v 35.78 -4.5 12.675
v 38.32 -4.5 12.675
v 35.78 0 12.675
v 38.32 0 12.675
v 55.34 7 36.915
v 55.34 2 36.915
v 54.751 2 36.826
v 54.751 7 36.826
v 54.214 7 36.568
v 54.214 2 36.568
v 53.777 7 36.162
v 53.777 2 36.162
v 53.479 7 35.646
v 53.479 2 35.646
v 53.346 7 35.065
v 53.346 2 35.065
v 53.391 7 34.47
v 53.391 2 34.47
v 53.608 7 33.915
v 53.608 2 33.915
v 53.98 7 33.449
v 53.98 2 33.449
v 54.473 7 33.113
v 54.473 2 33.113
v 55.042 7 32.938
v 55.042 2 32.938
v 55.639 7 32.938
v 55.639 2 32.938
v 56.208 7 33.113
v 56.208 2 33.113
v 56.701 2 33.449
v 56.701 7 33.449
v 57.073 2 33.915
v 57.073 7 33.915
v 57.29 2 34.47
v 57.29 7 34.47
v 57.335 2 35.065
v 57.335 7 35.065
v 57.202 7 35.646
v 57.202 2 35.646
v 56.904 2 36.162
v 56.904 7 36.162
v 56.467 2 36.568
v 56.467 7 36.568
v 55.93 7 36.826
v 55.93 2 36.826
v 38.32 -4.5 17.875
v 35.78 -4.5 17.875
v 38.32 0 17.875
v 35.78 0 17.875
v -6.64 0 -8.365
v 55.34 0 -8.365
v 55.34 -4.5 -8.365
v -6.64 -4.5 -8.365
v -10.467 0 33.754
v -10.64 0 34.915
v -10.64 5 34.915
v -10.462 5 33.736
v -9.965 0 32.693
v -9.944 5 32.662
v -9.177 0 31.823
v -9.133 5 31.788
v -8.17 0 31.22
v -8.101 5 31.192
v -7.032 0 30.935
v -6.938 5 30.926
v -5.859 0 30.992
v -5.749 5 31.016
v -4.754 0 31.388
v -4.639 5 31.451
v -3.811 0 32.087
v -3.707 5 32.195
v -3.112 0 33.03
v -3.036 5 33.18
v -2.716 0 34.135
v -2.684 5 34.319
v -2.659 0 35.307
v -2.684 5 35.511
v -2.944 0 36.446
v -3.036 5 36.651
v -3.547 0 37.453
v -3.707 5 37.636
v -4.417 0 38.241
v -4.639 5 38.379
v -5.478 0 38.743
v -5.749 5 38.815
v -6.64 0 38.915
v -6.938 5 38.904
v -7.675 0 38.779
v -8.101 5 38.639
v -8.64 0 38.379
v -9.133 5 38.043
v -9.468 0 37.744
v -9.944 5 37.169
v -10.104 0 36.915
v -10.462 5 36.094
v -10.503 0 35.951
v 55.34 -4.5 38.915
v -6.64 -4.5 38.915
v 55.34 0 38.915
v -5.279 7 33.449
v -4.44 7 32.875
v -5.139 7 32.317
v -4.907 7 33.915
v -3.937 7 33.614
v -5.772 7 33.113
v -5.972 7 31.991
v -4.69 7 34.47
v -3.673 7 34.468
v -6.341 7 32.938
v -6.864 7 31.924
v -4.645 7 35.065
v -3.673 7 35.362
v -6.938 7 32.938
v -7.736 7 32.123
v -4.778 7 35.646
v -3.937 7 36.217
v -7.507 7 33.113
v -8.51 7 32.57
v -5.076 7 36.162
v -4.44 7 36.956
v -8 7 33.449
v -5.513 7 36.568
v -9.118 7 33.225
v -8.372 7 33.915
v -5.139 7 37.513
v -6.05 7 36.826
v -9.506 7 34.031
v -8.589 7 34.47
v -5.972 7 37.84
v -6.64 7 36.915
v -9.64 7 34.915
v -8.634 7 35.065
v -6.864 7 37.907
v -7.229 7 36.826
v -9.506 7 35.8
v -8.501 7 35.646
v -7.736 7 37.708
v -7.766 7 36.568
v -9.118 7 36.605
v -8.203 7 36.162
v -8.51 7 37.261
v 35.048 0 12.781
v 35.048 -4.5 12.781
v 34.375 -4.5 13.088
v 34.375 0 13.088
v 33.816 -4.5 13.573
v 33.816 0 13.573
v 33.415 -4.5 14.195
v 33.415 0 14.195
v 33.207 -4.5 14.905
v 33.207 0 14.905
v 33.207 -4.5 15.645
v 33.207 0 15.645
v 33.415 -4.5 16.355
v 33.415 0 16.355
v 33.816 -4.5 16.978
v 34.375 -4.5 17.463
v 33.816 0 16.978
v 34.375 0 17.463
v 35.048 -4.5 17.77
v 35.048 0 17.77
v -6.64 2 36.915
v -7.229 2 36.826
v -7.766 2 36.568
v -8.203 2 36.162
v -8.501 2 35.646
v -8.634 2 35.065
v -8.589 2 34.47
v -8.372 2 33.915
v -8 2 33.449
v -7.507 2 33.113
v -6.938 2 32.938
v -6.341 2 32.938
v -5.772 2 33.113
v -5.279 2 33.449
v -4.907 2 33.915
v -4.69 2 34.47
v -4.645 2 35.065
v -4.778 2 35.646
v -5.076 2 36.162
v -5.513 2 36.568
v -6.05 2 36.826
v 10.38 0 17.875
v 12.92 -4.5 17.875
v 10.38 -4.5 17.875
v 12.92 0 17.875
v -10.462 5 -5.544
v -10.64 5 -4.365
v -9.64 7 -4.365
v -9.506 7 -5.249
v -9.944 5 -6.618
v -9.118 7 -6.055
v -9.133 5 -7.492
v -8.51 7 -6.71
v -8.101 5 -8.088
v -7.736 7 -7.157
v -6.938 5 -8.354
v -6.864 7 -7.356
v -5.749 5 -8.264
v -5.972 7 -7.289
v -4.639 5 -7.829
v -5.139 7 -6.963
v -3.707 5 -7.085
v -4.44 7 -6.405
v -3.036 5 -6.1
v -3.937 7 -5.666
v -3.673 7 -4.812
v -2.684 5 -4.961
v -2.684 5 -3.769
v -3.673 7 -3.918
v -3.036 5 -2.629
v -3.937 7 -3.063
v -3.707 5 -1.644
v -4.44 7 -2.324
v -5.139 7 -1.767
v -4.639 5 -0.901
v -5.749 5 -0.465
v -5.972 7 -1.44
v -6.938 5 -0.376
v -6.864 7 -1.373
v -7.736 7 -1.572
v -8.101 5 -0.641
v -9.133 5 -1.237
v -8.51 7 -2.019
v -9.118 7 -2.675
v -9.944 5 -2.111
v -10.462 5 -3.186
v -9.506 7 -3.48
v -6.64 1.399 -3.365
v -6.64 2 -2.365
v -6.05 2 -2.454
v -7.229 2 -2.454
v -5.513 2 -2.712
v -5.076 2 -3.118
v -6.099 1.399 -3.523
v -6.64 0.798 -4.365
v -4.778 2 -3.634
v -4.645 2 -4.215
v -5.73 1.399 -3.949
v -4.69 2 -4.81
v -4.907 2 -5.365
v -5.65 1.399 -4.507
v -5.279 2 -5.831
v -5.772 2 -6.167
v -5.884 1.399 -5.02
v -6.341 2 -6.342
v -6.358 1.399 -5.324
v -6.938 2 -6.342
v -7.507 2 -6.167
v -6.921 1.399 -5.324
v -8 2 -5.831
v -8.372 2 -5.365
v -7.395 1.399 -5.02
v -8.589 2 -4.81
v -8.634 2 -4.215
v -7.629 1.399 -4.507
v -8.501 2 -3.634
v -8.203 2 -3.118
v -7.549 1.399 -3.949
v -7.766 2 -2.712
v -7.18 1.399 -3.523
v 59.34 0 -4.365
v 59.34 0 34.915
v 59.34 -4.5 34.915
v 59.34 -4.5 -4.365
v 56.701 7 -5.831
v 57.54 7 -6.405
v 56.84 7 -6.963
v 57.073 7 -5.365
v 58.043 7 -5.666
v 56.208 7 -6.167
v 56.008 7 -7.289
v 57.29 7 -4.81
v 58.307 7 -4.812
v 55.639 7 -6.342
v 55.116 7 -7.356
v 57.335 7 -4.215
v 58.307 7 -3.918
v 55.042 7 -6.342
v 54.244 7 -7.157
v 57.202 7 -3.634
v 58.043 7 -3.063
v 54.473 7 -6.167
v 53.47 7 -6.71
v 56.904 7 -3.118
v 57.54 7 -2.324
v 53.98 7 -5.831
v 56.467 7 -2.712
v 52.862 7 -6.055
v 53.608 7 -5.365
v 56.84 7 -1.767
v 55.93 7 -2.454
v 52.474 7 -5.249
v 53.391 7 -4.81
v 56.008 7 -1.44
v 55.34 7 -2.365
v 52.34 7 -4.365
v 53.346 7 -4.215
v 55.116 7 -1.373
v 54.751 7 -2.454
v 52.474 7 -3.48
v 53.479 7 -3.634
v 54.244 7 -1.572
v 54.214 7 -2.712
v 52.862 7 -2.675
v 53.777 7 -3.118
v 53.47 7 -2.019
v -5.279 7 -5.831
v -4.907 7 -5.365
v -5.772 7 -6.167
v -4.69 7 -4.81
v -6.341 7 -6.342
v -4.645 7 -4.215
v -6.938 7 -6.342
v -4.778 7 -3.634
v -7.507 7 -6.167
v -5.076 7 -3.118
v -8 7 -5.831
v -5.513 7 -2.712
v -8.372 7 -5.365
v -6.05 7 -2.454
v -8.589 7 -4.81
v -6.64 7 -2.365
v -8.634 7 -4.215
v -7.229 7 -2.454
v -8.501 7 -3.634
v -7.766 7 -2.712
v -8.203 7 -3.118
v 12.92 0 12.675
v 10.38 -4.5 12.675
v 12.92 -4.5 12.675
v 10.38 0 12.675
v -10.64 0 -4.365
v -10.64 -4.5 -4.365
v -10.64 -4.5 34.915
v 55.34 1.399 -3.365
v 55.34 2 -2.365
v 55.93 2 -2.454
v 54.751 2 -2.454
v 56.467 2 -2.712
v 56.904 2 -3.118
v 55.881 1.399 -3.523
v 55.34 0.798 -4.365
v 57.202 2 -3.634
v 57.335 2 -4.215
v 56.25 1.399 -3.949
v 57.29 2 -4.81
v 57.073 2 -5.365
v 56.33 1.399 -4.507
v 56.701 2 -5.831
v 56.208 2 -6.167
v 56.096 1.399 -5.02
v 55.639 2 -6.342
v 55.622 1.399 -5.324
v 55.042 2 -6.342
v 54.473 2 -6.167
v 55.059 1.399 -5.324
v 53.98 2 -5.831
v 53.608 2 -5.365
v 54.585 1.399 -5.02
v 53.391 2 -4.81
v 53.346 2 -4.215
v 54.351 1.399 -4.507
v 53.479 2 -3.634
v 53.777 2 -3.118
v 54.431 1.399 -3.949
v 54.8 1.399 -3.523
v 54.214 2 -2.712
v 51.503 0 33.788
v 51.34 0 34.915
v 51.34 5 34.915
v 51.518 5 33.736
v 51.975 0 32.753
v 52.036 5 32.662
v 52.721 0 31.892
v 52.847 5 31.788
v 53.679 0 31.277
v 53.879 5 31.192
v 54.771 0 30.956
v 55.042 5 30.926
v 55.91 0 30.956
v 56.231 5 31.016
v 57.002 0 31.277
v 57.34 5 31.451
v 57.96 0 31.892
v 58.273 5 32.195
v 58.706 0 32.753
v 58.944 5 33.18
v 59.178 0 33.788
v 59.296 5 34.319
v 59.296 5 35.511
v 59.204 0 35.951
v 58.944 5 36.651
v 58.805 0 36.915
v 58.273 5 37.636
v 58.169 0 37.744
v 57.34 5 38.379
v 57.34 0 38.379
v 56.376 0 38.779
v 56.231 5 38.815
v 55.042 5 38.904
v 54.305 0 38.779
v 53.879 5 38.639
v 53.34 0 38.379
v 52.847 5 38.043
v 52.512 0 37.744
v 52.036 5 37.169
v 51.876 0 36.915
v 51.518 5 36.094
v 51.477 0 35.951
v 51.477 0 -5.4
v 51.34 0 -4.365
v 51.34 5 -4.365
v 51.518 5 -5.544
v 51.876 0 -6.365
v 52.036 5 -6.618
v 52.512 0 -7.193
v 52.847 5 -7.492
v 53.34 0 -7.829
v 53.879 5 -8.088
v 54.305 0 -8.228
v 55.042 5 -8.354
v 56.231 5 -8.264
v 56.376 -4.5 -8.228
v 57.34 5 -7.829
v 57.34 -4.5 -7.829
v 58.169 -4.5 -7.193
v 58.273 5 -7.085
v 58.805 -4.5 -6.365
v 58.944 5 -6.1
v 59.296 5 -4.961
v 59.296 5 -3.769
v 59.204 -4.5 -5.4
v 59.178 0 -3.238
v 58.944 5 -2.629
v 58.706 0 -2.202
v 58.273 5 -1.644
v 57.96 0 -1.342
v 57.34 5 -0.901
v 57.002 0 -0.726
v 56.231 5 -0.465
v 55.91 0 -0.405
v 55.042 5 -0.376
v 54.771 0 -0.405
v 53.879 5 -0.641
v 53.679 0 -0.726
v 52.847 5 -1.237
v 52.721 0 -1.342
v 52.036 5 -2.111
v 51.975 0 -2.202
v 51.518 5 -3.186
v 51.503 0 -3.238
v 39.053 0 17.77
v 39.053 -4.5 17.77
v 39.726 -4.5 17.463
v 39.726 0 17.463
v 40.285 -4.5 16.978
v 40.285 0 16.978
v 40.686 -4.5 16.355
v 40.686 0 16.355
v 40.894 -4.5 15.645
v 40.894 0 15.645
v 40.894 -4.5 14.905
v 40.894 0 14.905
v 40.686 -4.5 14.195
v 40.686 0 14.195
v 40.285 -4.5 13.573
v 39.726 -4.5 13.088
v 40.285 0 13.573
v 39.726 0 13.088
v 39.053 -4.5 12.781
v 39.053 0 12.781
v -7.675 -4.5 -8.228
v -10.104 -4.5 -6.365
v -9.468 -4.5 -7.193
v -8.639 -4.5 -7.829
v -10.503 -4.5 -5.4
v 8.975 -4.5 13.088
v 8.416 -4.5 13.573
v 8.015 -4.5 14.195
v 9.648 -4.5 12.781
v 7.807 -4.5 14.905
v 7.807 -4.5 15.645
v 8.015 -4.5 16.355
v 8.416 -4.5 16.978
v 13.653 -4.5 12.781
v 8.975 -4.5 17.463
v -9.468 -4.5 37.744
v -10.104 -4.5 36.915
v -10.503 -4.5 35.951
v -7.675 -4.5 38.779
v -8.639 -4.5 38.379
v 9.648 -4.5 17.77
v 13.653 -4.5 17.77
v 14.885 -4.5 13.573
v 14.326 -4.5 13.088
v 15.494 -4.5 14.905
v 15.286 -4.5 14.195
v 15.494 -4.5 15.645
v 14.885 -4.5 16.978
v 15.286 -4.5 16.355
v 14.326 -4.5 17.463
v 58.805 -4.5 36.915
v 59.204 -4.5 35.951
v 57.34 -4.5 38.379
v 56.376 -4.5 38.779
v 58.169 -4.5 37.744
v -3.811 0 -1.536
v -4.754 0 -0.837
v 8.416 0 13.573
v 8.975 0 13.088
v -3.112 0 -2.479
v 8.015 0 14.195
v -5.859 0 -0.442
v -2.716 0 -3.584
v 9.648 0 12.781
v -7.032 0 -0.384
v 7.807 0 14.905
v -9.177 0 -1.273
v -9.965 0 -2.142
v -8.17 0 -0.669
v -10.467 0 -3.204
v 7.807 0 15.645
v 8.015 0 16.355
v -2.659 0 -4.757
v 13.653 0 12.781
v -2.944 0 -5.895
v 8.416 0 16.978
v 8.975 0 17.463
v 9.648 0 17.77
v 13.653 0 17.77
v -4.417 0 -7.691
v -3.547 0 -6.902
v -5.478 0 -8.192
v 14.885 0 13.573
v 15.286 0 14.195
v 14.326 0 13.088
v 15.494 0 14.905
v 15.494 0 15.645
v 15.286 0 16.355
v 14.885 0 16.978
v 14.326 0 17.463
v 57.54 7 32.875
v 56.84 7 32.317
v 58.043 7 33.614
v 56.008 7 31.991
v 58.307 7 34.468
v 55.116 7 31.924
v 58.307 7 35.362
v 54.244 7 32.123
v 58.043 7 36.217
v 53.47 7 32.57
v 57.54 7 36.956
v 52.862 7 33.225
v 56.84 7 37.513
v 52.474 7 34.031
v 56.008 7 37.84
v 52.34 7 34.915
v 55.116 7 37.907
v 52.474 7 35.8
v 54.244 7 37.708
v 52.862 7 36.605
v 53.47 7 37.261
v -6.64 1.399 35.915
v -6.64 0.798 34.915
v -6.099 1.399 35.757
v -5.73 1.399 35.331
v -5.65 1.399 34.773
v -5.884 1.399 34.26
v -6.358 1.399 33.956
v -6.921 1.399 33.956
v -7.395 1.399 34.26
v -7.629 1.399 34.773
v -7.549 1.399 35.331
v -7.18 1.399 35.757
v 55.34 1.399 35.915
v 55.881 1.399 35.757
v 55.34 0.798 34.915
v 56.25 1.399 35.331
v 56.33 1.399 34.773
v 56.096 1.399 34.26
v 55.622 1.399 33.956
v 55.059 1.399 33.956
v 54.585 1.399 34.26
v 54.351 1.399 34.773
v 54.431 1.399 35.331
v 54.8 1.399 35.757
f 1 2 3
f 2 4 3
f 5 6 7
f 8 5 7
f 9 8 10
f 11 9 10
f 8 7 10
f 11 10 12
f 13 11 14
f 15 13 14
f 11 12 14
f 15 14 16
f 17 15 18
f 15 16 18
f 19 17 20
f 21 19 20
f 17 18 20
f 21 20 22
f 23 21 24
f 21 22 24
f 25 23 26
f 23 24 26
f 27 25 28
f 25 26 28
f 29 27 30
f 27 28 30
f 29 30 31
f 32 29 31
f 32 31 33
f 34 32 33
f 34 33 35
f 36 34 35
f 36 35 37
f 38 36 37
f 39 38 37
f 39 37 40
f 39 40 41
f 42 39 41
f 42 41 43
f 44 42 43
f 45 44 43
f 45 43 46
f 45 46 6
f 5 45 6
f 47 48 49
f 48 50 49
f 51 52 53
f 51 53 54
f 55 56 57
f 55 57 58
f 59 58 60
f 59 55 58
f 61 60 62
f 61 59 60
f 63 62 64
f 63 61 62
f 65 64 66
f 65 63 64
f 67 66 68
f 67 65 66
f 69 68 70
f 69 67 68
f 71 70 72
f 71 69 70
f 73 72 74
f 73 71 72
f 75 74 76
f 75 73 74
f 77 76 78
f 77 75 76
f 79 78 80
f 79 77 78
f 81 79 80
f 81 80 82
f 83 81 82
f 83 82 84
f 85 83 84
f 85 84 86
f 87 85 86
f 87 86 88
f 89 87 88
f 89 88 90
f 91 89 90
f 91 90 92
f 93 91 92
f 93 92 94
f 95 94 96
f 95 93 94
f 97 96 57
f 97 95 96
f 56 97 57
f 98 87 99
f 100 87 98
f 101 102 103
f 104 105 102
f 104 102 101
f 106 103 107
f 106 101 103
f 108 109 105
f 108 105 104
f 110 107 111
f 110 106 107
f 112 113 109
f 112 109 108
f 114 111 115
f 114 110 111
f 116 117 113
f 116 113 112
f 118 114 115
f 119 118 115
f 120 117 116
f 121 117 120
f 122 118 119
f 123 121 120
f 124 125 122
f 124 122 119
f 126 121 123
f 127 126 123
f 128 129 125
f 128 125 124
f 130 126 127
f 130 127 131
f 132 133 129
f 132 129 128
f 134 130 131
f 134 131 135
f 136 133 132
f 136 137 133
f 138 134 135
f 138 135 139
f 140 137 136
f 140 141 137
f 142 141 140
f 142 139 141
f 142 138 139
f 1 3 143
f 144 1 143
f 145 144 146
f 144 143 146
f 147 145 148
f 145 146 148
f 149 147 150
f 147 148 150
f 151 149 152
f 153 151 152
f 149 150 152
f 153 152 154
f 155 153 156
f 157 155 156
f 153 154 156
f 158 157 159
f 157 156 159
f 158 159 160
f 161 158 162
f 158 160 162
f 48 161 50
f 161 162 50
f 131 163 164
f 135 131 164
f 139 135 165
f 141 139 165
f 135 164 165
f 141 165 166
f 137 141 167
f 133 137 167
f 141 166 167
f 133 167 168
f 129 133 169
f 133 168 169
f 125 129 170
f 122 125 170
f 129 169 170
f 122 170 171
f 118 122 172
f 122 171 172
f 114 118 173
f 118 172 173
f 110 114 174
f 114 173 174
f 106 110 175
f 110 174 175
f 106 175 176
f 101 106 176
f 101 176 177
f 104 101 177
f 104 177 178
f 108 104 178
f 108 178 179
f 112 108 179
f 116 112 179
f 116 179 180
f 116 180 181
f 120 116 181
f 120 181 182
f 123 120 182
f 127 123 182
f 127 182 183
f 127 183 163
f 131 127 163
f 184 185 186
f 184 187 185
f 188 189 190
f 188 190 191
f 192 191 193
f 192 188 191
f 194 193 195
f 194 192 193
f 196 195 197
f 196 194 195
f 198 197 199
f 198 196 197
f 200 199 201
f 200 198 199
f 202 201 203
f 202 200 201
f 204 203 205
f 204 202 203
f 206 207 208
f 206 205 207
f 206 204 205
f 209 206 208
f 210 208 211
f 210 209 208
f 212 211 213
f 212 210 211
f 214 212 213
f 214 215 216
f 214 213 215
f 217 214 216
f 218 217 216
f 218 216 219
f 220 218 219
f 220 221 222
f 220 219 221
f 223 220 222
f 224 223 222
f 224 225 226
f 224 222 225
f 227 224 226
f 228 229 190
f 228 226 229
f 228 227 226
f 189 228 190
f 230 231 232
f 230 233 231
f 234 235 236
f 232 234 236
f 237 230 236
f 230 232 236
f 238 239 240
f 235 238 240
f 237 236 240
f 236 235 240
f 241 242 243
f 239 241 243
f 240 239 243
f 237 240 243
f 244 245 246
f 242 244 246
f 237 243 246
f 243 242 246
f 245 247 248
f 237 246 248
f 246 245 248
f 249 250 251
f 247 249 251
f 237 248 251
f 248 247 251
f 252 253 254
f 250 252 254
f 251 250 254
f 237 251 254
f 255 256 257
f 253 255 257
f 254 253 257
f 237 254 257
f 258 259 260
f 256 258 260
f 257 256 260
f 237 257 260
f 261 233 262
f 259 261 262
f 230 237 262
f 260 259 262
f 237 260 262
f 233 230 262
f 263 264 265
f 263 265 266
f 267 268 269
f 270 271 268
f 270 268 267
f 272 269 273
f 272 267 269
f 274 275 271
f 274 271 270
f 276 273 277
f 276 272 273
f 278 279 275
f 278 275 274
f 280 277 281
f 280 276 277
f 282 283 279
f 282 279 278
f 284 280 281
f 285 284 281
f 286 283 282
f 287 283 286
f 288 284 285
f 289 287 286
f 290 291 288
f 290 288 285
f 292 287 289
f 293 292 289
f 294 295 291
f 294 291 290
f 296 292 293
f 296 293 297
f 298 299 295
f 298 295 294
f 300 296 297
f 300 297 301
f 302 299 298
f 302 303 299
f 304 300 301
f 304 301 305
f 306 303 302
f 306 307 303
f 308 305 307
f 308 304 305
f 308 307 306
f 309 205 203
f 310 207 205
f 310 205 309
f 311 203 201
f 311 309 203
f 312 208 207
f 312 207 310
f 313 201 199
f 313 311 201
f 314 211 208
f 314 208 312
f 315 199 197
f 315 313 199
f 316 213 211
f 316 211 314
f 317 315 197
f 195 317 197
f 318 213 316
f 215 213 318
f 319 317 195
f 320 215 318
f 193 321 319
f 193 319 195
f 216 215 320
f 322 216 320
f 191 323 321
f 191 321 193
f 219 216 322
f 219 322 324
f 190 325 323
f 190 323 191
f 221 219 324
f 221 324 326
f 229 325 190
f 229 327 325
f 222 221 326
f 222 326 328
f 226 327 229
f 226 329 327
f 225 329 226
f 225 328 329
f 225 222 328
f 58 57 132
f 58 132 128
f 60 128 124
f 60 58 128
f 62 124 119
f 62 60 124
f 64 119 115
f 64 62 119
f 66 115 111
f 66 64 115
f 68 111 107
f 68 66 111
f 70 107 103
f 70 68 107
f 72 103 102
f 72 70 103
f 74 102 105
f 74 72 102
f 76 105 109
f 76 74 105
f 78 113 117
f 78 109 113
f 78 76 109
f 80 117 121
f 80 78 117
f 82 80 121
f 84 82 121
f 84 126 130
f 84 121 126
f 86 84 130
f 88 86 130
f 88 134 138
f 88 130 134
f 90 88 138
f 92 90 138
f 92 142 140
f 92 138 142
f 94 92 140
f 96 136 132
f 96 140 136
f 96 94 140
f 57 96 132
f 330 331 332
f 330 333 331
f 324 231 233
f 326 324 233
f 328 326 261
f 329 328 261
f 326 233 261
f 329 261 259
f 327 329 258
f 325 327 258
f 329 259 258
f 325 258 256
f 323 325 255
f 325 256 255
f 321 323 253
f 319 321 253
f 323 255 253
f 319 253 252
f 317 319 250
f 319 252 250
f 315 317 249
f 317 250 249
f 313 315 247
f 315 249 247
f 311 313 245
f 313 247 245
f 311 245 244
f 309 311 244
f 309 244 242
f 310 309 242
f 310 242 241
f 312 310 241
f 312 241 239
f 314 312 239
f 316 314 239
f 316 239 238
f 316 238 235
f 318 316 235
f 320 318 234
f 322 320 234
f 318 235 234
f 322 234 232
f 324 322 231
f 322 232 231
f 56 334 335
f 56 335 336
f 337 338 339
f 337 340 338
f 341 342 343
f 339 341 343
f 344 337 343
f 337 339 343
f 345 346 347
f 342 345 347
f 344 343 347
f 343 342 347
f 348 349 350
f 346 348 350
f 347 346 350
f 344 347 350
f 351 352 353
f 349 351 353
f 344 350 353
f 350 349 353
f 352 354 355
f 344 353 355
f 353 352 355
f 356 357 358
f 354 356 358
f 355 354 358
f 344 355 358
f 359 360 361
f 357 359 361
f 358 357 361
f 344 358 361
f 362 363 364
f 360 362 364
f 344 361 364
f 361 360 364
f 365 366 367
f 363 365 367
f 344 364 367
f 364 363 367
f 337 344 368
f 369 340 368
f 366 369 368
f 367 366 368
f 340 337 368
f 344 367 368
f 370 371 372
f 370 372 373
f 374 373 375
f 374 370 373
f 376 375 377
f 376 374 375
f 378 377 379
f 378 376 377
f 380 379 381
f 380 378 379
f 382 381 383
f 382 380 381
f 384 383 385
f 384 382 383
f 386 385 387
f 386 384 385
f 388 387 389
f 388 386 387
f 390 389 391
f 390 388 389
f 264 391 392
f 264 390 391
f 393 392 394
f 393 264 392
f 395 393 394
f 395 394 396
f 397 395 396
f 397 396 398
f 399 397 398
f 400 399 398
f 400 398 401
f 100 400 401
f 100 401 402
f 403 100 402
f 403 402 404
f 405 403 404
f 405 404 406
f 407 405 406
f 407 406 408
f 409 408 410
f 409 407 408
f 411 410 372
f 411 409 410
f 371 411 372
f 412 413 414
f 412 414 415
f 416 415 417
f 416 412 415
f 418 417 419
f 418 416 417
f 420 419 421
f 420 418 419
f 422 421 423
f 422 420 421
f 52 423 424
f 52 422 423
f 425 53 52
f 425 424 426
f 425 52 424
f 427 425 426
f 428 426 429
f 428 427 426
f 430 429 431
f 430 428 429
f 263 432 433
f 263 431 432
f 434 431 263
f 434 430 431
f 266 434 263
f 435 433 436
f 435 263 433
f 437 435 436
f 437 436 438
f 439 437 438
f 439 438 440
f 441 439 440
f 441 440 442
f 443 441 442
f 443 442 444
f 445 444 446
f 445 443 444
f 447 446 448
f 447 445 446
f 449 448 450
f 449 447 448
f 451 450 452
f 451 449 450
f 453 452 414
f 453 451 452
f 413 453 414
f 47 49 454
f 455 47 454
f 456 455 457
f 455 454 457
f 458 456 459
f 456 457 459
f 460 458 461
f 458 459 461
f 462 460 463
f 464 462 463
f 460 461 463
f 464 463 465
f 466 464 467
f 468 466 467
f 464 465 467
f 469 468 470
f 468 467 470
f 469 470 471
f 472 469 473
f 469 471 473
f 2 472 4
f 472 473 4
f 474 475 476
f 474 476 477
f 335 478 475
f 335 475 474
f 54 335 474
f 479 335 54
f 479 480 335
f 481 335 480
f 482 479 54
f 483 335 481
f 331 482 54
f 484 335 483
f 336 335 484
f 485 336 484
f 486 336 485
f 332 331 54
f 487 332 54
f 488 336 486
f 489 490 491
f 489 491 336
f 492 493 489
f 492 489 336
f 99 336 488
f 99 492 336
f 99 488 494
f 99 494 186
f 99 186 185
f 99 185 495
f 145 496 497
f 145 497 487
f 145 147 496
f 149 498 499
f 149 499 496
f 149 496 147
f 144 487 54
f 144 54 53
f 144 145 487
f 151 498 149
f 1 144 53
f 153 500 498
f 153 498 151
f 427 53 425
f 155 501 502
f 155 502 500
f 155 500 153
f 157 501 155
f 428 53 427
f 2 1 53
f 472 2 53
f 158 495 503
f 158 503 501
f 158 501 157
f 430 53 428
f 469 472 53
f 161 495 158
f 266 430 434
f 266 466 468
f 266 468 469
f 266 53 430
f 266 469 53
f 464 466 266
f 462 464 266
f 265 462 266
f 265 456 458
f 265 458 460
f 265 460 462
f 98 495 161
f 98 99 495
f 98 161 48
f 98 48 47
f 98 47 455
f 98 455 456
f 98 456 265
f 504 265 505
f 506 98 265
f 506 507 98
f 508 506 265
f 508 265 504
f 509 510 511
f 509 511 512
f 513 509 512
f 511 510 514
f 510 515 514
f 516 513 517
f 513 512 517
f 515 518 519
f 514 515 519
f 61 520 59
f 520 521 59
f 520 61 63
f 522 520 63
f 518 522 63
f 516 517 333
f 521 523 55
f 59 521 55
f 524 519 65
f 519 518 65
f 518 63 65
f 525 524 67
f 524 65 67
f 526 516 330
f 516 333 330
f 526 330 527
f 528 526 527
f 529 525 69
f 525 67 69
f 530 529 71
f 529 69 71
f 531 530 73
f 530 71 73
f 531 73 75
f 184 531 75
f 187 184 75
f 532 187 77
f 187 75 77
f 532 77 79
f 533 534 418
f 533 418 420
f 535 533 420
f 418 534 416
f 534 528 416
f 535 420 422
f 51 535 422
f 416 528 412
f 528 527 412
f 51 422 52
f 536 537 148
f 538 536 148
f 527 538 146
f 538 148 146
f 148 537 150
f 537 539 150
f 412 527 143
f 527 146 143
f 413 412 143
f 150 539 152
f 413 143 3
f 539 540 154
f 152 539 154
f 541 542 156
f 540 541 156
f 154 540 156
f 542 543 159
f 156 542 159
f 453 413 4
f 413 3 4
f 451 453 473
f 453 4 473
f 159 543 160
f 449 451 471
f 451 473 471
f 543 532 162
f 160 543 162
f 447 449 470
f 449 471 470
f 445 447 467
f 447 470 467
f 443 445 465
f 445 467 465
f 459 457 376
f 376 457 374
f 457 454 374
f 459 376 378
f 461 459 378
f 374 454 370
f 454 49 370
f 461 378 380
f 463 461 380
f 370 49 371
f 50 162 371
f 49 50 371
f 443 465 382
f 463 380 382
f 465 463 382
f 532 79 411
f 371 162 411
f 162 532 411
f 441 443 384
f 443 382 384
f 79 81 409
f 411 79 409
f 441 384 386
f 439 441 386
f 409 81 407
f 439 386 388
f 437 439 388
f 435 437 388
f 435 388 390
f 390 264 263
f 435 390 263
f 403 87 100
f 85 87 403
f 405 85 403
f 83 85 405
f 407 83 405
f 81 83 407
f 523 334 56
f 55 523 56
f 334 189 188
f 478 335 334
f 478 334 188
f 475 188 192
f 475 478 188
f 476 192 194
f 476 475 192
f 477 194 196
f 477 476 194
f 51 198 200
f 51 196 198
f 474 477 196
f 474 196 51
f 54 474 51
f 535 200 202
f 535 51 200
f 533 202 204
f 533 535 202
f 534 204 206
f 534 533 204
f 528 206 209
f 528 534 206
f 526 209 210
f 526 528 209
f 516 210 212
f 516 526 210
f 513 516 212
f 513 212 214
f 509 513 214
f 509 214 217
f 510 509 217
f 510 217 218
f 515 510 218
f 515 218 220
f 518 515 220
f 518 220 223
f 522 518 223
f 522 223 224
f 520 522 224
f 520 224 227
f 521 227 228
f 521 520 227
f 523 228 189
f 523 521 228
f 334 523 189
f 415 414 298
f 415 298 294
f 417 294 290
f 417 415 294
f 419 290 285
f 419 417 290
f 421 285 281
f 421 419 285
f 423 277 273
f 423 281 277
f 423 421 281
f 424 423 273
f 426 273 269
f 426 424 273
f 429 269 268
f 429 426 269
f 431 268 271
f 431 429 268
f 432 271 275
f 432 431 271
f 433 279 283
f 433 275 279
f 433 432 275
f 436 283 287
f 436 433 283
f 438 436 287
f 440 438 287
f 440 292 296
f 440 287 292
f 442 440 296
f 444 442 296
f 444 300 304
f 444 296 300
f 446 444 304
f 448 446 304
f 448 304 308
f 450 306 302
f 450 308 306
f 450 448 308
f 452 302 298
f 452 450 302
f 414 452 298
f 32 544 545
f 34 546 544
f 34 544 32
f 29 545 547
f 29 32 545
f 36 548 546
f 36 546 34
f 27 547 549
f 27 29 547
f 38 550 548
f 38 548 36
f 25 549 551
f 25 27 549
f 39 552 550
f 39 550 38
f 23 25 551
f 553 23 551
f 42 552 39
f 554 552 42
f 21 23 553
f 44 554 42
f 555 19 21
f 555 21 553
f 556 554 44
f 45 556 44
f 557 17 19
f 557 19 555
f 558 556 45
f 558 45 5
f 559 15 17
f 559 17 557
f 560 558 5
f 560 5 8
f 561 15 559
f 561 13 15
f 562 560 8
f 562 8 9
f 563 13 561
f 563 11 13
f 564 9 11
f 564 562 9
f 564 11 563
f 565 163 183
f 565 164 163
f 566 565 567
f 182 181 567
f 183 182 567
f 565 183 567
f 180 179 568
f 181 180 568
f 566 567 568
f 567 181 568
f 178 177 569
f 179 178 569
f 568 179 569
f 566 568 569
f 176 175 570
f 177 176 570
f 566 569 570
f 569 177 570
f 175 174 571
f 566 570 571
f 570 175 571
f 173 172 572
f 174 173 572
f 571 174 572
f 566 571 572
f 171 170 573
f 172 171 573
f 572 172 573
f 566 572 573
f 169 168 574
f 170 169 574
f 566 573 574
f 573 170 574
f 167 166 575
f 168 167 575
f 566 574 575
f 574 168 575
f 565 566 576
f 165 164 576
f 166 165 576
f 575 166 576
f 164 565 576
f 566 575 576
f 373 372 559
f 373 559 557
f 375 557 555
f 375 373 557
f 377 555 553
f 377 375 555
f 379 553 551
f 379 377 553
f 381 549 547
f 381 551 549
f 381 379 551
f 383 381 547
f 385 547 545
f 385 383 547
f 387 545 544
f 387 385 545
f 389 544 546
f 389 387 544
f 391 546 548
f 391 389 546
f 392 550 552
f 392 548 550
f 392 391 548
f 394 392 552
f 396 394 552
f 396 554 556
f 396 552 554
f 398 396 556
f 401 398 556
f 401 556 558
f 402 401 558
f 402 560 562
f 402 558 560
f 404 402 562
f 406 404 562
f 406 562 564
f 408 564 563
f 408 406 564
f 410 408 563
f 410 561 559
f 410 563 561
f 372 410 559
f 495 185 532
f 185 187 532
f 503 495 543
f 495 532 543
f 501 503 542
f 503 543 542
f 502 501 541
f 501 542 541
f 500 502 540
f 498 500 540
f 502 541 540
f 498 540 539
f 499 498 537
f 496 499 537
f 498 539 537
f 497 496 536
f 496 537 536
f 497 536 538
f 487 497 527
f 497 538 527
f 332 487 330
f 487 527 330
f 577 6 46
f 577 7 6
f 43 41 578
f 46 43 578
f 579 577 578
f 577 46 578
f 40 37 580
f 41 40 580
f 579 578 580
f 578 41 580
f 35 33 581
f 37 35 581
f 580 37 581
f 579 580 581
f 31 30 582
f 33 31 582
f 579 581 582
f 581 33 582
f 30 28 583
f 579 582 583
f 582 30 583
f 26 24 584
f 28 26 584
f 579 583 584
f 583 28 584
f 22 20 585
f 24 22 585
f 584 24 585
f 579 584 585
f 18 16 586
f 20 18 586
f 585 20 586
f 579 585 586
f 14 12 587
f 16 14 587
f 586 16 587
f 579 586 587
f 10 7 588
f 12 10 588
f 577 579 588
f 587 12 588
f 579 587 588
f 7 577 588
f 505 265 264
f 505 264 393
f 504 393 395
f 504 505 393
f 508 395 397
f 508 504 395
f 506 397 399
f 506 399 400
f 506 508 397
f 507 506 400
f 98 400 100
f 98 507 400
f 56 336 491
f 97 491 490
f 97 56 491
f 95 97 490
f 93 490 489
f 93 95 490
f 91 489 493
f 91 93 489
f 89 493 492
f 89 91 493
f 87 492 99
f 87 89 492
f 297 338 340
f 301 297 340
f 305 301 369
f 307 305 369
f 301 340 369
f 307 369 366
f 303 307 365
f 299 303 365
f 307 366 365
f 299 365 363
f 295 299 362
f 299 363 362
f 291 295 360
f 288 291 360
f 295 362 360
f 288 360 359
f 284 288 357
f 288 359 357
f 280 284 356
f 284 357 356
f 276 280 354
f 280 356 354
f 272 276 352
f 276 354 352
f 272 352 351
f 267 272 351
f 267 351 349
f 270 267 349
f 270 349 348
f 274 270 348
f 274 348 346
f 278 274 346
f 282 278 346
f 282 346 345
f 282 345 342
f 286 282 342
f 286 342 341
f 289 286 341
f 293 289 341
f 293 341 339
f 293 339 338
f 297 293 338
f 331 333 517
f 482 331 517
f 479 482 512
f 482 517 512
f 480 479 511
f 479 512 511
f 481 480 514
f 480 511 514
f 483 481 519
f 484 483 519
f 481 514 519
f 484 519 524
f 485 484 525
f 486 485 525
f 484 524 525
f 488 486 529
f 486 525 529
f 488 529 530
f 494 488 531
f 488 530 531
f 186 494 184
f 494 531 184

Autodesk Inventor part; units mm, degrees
ref_plane "YZ Plane" through (0, 0, 0) normal (1, 0, 0) x (0, 1, 0)
ref_plane "XZ Plane" through (0, 0, 0) normal (0, 1, 0) x (-1, 0, 0)
ref_plane "XY Plane" through (0, 0, 0) normal (0, 0, 1) x (1, 0, 0)
sketch "proto-board hole layout" plane through (0, 0, 0) normal (0, 1, 0) x (-1, 0, 0)
  circle A0 centre (6.6395, -4.3647) radius 1.49
  circle A1 centre (-55.3405, -4.3647) radius 1.49
  circle A2 centre (-55.3405, 34.9153) radius 1.49
  circle A3 centre (6.6395, 34.9153) radius 1.49
  line L0 (5.1495, -4.3647) -> (-53.8505, -4.3647) construction
  line L1 (5.1495, 34.9153) -> (-53.8505, 34.9153) construction
  line L2 (-55.3405, 33.4253) -> (-55.3405, -2.8747) construction
  line L3 (6.6395, 33.4253) -> (6.6395, -2.8747) construction
  dimension "d0" = 2.98
  dimension "d1" = 59
  dimension "d2" = 36.3
sketch "Sketch3" plane through (0, 0, 0) normal (0, 1, 0) x (-1, 0, 0)
  circle A0 centre (6.6395, -4.3647) radius 1.49 projected
  circle A1 centre (6.6395, -4.3647) radius 4
  point P0 (0, 0)
  dimension "d15" = 8
extrude "Extrusion2" add sketch "Sketch3" along normal blind 7 contours A0 | A1
sketch "Sketch4" plane through (-6.6395, 7, -4.3647) normal (0, 1, 0) x (1, 0, 0)
  circle A0 centre (0, 0) radius 4 construction
  point P0 (6.6395, -4.3647)
hole "Hole1" at (-6.6395, 7, -4.3647) direction (0, -1, 0) diameter 4 depth 5 tip angle 118
chamfer "Chamfer1" distance 1 distance2 2 1 edges at (-2.6395, 7, -4.3647) measured on face at (-9.9293, 7, -4.7642)
pattern_sketch "Sketch Driven Pattern1" from (-6.6395, 0, -4.3647) copies at (55.3405, 0, -4.3647) at (55.3405, 0, 34.9153) at (-6.6395, 0, 34.9153)
sketch "Sketch5" plane through (-6.6395, 0, 34.9153) normal (0, -1, 0) x (1, 0, 0)
  circle A0 centre (0, 0) radius 4 projected
  circle A1 centre (61.98, 0) radius 4 projected
  circle A2 centre (61.98, -39.28) radius 4 projected
  circle A3 centre (0, -39.28) radius 4 projected
  line L0 (-4, 4) -> (65.98, 4)
  line L1 (65.98, 4) -> (65.98, -43.28)
  line L2 (65.98, -43.28) -> (-4, -43.28)
  line L3 (-4, -43.28) -> (-4, 4)
  point P0 (6.6395, -34.9153)
  point P1 (-4, 0)
  point P2 (-4, -39.28)
  point P3 (0, -43.28)
  point P4 (61.98, -43.28)
  point P5 (65.98, -39.28)
  point P6 (65.98, 0)
  point P7 (61.98, 4)
  point P8 (0, 4)
extrude "Extrusion3" add sketch "Sketch5" along normal blind 4.5 contours A0 | A0 L0 A1 L1 A2 L2 A3 L3 | A1 | A3 | A2
sketch "Sketch6" plane through (-6.6395, 0, 34.9153) normal (0, 1, 0) x (1, 0, 0)
  line L0 (0, 43.28) -> (61.98, 43.28) projected
  line L1 (30.99, 43.28) -> (30.99, -4) construction
  line L2 (61.98, -4) -> (0, -4) projected
  line L3 (-4, 0) -> (-4, 39.28) projected
  line L4 (-4, 19.64) -> (65.98, 19.64) construction
  line L5 (65.98, 39.28) -> (65.98, 0) projected
  line L6 (19.56, 19.64) -> (17.02, 19.64) construction
  line L7 (19.56, 17.04) -> (17.02, 17.04)
  line L8 (17.02, 22.24) -> (19.56, 22.24)
  arc A0 (19.56, 17.04) -> (19.56, 22.24) centre (19.56, 19.64) ccw
  arc A1 (17.02, 22.24) -> (17.02, 17.04) centre (17.02, 19.64) ccw
  line L9 (42.42, 17.04) -> (44.96, 17.04)
  line L10 (44.96, 22.24) -> (42.42, 22.24)
  arc A2 (42.42, 22.24) -> (42.42, 17.04) centre (42.42, 19.64) ccw
  arc A3 (44.96, 17.04) -> (44.96, 22.24) centre (44.96, 19.64) ccw
  point P0 (6.6395, 34.9153)
  point P1 (18.29, 19.64)
  point P2 (18.29, 22.24)
  point P3 (18.29, 17.04)
  dimension "d21" = 11.43
  dimension "d22" = 13.97
  dimension "d23" = 5.2
extrude "Extrusion4" cut sketch "Sketch6" against normal blind 4.5
properties part number "proto-board_standoffs_plate_t-slot-2inx1in"
